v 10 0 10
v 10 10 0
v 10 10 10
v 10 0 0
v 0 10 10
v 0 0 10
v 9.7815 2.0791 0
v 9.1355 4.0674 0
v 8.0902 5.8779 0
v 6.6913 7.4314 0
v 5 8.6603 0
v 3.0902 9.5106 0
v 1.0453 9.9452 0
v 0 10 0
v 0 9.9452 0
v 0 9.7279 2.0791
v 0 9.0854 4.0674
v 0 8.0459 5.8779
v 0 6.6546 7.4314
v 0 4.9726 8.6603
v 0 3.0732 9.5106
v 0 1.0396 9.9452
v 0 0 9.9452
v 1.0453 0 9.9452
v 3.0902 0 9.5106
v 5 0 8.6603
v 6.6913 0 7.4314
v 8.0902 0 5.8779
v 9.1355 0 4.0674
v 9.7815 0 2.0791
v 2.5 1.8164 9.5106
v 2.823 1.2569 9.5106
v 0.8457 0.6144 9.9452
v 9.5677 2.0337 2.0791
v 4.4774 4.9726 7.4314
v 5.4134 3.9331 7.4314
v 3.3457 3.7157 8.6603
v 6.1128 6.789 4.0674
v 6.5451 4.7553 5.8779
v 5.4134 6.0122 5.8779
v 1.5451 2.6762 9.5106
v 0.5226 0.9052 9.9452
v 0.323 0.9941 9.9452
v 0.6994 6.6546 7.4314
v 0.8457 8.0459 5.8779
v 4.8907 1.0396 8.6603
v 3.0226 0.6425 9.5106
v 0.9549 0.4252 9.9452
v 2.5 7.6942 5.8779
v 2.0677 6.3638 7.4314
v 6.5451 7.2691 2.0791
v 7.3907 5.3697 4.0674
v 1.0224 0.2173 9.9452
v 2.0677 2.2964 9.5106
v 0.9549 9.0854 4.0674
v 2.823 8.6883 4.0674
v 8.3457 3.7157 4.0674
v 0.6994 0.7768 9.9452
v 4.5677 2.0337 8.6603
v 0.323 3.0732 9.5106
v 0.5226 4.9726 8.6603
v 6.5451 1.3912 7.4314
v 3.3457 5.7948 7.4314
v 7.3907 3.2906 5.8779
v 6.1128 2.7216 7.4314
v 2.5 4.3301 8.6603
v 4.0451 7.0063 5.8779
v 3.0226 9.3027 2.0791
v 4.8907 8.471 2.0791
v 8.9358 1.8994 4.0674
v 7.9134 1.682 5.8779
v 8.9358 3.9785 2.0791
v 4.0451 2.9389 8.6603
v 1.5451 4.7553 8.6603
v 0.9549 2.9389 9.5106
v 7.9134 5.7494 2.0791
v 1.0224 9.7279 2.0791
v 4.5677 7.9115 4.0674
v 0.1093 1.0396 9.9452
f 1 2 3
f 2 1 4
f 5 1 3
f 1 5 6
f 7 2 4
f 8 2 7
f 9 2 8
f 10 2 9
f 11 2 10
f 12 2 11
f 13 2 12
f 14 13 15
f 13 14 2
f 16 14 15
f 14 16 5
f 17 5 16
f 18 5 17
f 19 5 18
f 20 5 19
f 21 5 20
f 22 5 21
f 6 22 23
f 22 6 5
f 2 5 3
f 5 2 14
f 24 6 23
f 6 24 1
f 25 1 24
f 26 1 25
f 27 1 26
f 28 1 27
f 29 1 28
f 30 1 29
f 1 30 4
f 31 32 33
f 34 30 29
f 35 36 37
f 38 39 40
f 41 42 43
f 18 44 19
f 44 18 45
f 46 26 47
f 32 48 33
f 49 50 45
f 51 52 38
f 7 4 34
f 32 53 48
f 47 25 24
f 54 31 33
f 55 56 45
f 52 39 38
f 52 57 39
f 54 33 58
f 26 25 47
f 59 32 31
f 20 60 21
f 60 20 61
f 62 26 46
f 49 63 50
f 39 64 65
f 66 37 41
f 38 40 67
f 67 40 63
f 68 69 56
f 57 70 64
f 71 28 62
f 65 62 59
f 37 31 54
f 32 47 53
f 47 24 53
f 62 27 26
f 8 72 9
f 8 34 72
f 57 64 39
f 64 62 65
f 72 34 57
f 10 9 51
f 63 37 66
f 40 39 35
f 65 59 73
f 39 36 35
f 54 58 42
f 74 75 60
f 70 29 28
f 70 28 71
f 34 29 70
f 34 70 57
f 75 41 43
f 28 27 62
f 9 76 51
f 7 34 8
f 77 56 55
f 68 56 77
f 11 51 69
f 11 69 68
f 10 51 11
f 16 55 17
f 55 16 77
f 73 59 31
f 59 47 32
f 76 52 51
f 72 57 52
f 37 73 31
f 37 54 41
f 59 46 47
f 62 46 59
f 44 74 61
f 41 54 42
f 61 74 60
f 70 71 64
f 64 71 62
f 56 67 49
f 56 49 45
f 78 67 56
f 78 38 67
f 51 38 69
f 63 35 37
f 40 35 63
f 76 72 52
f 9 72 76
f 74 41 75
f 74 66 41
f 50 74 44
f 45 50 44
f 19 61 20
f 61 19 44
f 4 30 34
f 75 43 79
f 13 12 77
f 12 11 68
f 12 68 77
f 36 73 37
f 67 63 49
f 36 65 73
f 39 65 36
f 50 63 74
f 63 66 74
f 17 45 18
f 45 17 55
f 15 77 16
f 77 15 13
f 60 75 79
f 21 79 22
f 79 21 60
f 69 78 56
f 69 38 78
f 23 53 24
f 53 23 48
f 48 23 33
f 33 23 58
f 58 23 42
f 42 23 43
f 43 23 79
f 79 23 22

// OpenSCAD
difference() {
	cube(size = 10);
	sphere(r = 10);
}
/***********************************************
*********      SolidPython code:      **********
************************************************
 
from solid.objects import *
from solid.utils import *
from solid.solidpython import *

d = difference()(
	cube(10),
	sphere(10)
)
scad_render_to_file(d, "hand_eye_coordination.scad") 
 
************************************************/
